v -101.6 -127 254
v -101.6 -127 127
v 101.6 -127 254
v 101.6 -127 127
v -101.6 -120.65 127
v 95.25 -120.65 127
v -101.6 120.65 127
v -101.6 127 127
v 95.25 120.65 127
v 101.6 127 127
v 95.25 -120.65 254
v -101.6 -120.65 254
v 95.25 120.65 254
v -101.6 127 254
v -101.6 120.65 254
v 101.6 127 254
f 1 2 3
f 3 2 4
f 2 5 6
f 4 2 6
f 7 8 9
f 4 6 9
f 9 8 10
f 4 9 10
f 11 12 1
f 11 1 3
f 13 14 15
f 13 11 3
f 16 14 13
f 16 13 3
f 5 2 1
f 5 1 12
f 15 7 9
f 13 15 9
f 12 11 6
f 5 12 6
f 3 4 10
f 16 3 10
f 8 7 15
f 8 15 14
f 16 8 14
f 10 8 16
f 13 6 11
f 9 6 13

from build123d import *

# Parameters (mm, degrees)
F7_W      = 203.2
F7_H      = 254
F8_DEPTH  = 127
F9_T      = -6.35
F10_DEPTH = 25.4


with BuildPart() as f8:
    # F7 (on offset) → F8 (new body)
    with BuildSketch(Plane.XY.offset(127)):
        Rectangle(F7_W, F7_H)
    extrude(amount=F8_DEPTH)

    # F9
    f9_openings = [f8.faces().sort_by_distance(p)[0] for p in [
        (0, 0, 254),
        (0, 0, 127),
    ]]
    offset(amount=F9_T, openings=f9_openings)

    # F10 (cut): a face of the model
    f10_faces = [f8.faces().sort_by_distance(p)[0] for p in [
        (-95.25, 0, 190.5),
    ]]
    extrude(f10_faces, amount=-F10_DEPTH, mode=Mode.SUBTRACT)


solid = f8.part
